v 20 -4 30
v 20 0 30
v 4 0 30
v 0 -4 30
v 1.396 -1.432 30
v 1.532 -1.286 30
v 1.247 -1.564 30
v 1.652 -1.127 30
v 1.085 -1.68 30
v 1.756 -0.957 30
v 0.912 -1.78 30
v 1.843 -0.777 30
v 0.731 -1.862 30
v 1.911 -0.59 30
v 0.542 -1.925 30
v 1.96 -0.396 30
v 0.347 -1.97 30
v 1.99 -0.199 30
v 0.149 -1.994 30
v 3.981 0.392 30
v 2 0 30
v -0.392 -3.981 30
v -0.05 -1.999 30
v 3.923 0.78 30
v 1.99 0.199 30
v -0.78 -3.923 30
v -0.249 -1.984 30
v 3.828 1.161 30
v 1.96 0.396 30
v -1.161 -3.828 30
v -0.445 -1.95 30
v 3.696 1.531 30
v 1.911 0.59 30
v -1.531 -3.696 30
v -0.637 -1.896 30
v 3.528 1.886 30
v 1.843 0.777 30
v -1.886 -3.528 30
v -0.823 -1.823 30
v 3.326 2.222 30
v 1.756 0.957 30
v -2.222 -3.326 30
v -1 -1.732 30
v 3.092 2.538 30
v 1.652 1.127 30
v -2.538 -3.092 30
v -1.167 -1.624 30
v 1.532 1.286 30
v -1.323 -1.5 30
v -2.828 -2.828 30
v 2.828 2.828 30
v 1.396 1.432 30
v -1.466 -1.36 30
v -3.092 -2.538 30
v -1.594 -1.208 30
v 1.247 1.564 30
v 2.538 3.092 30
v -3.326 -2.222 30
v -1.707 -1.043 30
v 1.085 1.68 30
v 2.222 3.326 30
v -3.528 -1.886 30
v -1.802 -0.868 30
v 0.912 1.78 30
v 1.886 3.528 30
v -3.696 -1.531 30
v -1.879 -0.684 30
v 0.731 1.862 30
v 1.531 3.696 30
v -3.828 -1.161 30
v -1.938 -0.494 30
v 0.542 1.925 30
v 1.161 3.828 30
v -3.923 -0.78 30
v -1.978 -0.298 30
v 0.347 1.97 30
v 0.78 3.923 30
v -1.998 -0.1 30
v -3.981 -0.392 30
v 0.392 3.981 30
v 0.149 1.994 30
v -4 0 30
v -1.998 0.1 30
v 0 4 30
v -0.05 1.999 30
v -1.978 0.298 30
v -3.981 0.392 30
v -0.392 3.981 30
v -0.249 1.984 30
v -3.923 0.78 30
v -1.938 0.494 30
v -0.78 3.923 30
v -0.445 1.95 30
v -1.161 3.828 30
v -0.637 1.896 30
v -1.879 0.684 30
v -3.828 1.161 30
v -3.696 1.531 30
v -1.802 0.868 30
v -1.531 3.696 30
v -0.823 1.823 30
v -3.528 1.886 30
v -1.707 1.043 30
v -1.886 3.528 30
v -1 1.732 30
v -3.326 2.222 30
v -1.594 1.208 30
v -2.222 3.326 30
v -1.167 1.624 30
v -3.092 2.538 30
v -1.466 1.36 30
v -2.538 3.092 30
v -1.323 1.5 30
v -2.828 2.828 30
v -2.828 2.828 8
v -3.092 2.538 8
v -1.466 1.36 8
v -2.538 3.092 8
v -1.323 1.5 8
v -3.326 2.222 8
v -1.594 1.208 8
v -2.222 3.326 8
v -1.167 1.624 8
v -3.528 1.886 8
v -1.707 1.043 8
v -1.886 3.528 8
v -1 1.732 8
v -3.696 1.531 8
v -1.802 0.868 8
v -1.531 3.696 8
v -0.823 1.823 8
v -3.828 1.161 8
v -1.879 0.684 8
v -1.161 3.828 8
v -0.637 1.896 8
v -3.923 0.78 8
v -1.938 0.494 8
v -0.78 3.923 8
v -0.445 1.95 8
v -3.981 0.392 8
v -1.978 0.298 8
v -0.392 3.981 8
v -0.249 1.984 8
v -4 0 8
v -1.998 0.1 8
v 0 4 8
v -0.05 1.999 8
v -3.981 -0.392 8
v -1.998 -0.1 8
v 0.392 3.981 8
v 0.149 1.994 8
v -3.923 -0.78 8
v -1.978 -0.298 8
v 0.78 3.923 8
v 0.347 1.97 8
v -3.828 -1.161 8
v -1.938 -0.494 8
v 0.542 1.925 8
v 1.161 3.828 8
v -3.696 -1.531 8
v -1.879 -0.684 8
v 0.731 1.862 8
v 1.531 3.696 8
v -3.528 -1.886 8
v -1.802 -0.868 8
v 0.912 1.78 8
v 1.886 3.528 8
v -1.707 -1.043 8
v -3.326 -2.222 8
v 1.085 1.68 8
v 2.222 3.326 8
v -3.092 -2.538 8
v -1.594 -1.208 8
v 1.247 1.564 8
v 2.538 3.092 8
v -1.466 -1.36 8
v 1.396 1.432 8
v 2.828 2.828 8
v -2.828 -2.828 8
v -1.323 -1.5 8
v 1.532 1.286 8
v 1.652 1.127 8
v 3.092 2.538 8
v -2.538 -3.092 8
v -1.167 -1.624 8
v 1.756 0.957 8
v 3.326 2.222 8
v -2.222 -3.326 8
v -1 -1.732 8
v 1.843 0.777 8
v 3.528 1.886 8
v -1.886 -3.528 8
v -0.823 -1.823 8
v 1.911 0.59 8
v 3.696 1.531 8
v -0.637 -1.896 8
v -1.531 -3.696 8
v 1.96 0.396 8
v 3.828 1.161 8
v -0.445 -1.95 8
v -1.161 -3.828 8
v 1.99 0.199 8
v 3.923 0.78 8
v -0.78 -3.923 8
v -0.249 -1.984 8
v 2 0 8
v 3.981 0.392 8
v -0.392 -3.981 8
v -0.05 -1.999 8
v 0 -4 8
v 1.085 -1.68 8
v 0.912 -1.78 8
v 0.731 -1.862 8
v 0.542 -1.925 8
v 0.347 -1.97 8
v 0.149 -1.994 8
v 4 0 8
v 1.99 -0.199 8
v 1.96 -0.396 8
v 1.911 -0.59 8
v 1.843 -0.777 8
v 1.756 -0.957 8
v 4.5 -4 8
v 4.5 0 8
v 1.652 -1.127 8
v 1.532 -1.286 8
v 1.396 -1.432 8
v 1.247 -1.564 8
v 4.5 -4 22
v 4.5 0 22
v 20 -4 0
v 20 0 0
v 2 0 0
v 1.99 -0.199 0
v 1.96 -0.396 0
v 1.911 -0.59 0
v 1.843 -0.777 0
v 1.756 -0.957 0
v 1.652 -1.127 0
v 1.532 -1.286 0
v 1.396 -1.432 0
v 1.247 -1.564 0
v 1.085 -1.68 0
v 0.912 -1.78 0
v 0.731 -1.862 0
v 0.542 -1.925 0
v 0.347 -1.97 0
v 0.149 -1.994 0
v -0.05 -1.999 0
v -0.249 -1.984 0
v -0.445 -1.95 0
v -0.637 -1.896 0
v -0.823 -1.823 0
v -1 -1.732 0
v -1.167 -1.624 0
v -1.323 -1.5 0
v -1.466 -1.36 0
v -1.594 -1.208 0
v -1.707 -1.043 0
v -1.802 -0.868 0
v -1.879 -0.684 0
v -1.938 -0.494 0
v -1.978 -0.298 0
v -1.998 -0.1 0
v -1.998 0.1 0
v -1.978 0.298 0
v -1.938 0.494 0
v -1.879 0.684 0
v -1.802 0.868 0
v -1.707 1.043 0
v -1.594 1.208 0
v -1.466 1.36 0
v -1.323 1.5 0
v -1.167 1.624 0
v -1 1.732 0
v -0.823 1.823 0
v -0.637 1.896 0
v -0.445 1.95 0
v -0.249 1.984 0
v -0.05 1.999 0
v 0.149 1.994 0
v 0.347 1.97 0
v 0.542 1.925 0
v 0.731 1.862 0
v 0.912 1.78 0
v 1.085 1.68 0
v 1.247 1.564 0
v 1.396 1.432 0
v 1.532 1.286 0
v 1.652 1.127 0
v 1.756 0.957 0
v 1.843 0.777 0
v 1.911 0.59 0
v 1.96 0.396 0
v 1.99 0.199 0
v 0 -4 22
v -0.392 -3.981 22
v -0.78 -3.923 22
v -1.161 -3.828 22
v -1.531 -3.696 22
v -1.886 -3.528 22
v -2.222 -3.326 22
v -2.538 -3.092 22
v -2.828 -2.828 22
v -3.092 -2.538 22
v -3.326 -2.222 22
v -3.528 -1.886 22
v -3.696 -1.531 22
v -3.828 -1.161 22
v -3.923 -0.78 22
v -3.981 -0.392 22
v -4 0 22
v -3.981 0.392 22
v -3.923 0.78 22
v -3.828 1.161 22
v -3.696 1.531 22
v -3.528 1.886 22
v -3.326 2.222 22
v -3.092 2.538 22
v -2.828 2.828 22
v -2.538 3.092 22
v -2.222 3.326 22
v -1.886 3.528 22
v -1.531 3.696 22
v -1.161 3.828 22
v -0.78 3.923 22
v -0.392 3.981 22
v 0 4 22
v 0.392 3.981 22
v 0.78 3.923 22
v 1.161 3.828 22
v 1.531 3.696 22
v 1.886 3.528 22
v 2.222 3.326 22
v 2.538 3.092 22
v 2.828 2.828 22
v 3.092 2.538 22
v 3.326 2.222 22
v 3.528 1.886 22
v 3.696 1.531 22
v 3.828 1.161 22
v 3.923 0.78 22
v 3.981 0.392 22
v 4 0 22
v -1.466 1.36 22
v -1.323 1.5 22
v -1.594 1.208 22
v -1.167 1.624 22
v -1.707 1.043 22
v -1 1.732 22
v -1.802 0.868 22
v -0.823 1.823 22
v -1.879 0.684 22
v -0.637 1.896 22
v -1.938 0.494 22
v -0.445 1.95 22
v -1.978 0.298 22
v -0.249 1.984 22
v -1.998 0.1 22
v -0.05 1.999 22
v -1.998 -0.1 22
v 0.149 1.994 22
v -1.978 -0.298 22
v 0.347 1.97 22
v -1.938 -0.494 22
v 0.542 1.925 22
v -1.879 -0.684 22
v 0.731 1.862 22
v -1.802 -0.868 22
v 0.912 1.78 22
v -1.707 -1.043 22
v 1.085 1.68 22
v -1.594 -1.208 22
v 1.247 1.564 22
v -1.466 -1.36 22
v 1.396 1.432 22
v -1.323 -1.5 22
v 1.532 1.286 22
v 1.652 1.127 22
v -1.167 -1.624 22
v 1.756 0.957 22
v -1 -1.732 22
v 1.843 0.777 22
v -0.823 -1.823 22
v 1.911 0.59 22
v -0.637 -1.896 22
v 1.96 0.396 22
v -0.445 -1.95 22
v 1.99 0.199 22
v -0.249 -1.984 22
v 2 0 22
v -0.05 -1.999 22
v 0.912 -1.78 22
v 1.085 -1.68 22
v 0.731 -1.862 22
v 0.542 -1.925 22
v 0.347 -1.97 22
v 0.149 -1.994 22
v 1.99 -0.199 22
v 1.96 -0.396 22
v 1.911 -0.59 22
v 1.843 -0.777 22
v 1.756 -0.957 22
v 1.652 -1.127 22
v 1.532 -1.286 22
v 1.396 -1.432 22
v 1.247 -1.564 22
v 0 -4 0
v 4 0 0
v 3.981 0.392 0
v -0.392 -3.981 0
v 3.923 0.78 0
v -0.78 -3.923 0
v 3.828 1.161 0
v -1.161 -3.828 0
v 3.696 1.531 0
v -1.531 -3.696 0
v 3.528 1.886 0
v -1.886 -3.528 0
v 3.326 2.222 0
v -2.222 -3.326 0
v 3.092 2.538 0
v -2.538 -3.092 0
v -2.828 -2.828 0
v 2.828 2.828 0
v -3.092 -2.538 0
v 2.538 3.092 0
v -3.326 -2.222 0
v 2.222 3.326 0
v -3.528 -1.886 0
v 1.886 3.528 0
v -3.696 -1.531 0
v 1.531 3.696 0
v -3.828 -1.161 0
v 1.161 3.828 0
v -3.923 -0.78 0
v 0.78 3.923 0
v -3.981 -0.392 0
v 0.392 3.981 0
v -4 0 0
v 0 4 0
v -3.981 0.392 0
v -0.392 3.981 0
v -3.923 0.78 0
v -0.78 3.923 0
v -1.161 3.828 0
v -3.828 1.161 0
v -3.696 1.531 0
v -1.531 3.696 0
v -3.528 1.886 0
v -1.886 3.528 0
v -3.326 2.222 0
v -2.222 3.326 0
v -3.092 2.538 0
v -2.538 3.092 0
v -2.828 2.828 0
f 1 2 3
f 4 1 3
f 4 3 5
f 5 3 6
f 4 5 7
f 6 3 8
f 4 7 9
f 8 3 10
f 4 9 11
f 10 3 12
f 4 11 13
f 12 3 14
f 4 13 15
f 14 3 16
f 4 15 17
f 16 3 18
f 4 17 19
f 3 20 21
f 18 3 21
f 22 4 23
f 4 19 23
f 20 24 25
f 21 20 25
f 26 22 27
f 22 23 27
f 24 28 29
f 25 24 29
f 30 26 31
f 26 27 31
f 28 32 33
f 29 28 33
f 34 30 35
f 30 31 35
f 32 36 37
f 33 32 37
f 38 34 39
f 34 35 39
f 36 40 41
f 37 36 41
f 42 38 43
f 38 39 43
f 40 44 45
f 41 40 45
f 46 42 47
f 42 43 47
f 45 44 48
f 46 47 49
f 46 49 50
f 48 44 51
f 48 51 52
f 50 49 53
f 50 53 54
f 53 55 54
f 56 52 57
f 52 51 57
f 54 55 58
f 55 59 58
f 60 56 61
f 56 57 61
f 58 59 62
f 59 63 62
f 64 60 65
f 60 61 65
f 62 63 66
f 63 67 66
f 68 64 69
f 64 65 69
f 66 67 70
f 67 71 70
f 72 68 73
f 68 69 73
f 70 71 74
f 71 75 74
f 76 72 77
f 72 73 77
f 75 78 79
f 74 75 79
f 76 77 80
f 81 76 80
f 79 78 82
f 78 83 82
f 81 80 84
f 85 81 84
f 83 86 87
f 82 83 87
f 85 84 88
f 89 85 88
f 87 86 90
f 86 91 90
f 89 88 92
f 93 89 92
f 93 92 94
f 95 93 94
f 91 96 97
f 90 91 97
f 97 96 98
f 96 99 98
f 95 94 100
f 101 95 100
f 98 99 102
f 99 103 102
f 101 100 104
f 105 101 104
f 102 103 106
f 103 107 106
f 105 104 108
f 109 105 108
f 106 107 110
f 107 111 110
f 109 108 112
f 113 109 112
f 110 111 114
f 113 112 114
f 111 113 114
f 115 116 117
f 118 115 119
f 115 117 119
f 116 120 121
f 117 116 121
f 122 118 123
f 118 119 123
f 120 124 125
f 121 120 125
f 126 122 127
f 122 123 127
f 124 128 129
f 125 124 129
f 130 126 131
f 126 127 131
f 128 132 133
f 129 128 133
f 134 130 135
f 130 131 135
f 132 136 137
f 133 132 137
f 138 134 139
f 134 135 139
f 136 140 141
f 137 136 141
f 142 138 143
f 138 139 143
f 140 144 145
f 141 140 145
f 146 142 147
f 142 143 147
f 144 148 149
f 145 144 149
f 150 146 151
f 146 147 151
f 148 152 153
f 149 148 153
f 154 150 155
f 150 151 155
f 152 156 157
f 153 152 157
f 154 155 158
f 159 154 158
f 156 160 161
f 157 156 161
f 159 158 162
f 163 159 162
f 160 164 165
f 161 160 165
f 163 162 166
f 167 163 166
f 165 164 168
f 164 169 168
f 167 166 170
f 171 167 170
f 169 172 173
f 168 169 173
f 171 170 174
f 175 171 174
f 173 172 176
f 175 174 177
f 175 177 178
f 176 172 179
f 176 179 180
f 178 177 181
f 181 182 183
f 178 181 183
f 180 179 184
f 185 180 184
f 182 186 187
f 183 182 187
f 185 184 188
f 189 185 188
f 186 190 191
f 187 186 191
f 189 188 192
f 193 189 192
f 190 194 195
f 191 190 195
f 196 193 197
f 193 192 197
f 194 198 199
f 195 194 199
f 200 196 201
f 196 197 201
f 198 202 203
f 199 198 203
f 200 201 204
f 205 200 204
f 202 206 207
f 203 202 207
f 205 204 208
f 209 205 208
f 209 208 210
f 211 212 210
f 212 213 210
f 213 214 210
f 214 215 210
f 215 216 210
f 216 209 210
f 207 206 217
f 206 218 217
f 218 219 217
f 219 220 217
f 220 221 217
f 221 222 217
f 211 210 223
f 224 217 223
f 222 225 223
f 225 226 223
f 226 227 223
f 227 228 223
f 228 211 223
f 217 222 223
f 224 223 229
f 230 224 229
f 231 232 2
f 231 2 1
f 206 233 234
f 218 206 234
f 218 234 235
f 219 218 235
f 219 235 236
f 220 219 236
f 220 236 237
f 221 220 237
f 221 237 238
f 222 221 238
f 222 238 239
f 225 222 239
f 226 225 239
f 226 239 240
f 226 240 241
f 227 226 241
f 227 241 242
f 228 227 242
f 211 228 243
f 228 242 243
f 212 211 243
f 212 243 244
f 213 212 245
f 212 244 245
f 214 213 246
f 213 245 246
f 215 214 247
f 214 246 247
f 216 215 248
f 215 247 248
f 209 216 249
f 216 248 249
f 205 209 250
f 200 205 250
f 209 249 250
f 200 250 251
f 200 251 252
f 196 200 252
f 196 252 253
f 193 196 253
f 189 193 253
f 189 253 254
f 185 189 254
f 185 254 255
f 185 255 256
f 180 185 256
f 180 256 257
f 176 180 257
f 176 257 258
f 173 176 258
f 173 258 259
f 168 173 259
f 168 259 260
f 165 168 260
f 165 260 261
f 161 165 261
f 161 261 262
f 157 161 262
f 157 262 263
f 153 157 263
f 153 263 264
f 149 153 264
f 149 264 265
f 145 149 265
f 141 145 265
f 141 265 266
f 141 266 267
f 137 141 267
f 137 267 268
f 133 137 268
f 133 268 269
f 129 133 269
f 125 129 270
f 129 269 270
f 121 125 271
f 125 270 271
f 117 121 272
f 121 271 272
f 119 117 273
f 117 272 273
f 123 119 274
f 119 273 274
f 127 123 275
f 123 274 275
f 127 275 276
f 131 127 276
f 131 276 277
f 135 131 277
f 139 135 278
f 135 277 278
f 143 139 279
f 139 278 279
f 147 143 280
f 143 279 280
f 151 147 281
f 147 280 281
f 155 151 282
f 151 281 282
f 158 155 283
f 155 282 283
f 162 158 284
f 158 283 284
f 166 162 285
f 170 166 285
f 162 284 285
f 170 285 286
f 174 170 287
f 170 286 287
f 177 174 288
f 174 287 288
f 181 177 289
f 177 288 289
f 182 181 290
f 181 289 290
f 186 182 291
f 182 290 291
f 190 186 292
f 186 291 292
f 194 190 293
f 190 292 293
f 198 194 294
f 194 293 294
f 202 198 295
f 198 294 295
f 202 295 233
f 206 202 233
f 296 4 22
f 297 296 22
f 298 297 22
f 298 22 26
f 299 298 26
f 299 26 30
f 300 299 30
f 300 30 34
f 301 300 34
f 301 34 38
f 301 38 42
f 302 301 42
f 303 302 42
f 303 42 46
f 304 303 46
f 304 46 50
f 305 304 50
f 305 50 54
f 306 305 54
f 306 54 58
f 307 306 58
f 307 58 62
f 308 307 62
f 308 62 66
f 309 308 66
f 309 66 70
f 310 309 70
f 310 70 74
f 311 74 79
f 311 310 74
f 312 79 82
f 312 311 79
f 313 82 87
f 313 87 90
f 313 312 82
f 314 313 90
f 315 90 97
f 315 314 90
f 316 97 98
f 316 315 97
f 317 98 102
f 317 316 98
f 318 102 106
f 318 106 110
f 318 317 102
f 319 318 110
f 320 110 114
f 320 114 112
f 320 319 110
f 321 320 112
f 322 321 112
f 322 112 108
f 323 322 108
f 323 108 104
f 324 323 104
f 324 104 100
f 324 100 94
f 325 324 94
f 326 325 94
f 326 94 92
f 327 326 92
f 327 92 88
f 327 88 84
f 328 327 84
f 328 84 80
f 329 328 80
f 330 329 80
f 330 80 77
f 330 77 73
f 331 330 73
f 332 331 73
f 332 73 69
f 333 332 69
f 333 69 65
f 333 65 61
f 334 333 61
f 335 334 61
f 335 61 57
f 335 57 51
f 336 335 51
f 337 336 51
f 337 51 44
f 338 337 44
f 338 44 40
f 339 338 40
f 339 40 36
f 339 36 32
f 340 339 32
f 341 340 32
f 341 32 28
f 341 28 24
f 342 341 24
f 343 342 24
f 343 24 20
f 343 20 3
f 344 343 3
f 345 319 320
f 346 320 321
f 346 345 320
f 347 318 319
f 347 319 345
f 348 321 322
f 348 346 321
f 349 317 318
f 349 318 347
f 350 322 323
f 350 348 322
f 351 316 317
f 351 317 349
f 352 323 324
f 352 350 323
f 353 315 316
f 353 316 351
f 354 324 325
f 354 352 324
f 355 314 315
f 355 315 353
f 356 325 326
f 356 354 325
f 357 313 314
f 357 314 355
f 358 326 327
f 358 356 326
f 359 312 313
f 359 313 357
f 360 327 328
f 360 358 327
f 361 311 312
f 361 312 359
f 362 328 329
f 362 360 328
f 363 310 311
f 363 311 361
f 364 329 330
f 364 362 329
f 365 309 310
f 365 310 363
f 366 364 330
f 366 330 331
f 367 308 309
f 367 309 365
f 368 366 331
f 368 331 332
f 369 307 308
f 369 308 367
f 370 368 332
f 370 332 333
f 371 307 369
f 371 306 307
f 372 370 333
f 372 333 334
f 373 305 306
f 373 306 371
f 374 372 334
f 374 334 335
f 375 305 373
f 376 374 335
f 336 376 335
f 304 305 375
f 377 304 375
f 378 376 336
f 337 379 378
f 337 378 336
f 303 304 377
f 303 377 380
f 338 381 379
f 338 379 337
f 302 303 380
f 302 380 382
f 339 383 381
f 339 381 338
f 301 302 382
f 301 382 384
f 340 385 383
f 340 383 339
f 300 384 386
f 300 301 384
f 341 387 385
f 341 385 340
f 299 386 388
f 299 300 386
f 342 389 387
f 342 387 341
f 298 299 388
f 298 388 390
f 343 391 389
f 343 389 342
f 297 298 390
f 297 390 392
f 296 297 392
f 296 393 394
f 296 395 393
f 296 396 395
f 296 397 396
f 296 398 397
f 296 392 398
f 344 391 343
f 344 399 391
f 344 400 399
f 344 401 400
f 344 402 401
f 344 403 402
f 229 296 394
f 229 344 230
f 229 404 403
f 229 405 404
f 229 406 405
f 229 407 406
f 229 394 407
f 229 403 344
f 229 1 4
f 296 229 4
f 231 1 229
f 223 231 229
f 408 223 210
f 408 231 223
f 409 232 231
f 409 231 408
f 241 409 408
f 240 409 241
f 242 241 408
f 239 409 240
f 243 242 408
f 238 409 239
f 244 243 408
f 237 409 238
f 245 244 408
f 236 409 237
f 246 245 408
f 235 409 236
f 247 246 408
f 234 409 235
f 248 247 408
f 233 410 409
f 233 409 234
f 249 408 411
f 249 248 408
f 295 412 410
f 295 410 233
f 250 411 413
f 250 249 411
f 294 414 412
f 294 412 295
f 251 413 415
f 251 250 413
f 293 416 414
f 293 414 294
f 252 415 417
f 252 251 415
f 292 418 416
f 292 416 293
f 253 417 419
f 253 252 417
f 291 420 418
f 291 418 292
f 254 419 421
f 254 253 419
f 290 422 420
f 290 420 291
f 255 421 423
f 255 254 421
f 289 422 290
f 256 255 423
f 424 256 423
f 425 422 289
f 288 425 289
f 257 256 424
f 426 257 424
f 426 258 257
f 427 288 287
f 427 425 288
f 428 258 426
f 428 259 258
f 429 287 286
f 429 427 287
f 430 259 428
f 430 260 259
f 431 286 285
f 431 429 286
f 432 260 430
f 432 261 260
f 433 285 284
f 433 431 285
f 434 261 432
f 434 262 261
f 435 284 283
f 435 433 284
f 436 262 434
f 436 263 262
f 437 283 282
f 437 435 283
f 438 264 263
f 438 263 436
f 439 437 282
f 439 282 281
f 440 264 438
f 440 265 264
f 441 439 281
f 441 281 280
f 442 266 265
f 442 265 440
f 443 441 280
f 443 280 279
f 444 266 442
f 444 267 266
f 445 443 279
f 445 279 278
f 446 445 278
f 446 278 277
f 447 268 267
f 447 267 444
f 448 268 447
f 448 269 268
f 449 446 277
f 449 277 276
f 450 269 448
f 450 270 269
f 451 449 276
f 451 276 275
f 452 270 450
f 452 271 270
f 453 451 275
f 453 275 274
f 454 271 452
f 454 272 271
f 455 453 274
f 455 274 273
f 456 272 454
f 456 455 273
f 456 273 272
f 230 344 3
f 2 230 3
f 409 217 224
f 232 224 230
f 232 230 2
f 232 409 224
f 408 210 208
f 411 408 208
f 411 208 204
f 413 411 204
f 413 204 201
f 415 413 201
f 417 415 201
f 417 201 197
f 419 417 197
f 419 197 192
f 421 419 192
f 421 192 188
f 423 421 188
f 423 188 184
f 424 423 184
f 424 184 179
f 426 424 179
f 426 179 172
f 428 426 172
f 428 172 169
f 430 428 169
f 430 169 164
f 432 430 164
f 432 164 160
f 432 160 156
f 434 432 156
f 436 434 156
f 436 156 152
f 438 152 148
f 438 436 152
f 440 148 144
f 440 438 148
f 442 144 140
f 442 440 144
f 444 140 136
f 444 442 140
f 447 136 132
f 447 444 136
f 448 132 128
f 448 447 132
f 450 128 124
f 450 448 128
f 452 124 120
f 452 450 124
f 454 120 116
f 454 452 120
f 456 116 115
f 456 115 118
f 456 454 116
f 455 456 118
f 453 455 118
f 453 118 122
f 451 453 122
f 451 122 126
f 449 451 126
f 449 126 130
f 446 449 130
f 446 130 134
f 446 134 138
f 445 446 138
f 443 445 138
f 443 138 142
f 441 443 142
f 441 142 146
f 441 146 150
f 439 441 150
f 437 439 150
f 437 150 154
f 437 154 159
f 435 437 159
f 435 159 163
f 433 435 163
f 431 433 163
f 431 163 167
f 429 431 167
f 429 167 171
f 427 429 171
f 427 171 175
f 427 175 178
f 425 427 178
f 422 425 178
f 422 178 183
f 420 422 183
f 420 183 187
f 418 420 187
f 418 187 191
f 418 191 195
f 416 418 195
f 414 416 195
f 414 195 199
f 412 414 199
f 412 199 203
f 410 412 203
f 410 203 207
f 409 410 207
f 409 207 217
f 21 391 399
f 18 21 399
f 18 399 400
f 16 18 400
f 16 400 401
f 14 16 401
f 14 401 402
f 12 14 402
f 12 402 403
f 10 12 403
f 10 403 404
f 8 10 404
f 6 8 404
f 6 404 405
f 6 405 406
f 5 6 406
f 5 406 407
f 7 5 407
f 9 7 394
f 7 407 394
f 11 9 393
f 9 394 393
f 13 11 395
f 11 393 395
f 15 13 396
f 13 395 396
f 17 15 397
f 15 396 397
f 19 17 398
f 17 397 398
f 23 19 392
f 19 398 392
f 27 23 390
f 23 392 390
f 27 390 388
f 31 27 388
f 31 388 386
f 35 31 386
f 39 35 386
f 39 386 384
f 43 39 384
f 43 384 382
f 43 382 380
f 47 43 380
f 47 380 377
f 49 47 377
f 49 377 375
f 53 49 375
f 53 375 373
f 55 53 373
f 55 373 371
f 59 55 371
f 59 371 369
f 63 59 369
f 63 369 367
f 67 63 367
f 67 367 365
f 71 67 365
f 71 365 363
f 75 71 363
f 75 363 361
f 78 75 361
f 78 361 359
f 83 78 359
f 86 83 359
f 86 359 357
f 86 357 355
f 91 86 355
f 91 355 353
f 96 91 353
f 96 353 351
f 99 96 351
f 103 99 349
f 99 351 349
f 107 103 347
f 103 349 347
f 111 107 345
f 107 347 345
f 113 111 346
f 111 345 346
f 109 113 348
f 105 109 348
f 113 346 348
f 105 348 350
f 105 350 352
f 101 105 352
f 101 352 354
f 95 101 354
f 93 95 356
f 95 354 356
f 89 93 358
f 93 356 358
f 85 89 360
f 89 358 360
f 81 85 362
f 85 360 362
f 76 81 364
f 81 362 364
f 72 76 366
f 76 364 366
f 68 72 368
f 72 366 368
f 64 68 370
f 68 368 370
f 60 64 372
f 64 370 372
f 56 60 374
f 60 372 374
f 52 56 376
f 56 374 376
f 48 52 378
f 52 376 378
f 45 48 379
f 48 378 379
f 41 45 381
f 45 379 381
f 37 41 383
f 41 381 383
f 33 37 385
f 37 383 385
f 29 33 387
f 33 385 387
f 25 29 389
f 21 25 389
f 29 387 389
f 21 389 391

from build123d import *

# Parameters (mm, degrees)
EXTRUDE_1_DEPTH     = 30
SKETCH_2_W          = 9
SKETCH_2_H          = 14
CUT_EXTRUDE_1_DEPTH = 15
SKETCH_3_R          = 2
CUT_EXTRUDE_2_DEPTH = 32


with BuildPart() as part:
    # 草图1 → 凸台-拉伸1 (new body)
    with BuildSketch(Plane.XY):
        with BuildLine():
            Line((4, 0), (20, 0))
            Line((20, 0), (20, -4))
            Line((20, -4), (0, -4))
            ThreePointArc((0, -4), (-2.828427125, 2.828427125), (4, 0))
        make_face()
    extrude(amount=EXTRUDE_1_DEPTH)

    # 草图2 → 切除-拉伸1 (cut)
    with BuildSketch(Plane.XZ.offset(4)):
        with Locations((0, 15)):
            Rectangle(SKETCH_2_W, SKETCH_2_H)
    extrude(amount=-CUT_EXTRUDE_1_DEPTH, mode=Mode.SUBTRACT)

    # 草图3 → 切除-拉伸2 (cut)
    with BuildSketch(Plane(origin=(0, 0, 0), x_dir=(-1, 0, 0), z_dir=(0, 0, -1))):
        with Locations(Location((0, 0, 0), (0, 0, 180))):
            Circle(SKETCH_3_R)
    extrude(amount=-CUT_EXTRUDE_2_DEPTH, mode=Mode.SUBTRACT)


solid = part.part
